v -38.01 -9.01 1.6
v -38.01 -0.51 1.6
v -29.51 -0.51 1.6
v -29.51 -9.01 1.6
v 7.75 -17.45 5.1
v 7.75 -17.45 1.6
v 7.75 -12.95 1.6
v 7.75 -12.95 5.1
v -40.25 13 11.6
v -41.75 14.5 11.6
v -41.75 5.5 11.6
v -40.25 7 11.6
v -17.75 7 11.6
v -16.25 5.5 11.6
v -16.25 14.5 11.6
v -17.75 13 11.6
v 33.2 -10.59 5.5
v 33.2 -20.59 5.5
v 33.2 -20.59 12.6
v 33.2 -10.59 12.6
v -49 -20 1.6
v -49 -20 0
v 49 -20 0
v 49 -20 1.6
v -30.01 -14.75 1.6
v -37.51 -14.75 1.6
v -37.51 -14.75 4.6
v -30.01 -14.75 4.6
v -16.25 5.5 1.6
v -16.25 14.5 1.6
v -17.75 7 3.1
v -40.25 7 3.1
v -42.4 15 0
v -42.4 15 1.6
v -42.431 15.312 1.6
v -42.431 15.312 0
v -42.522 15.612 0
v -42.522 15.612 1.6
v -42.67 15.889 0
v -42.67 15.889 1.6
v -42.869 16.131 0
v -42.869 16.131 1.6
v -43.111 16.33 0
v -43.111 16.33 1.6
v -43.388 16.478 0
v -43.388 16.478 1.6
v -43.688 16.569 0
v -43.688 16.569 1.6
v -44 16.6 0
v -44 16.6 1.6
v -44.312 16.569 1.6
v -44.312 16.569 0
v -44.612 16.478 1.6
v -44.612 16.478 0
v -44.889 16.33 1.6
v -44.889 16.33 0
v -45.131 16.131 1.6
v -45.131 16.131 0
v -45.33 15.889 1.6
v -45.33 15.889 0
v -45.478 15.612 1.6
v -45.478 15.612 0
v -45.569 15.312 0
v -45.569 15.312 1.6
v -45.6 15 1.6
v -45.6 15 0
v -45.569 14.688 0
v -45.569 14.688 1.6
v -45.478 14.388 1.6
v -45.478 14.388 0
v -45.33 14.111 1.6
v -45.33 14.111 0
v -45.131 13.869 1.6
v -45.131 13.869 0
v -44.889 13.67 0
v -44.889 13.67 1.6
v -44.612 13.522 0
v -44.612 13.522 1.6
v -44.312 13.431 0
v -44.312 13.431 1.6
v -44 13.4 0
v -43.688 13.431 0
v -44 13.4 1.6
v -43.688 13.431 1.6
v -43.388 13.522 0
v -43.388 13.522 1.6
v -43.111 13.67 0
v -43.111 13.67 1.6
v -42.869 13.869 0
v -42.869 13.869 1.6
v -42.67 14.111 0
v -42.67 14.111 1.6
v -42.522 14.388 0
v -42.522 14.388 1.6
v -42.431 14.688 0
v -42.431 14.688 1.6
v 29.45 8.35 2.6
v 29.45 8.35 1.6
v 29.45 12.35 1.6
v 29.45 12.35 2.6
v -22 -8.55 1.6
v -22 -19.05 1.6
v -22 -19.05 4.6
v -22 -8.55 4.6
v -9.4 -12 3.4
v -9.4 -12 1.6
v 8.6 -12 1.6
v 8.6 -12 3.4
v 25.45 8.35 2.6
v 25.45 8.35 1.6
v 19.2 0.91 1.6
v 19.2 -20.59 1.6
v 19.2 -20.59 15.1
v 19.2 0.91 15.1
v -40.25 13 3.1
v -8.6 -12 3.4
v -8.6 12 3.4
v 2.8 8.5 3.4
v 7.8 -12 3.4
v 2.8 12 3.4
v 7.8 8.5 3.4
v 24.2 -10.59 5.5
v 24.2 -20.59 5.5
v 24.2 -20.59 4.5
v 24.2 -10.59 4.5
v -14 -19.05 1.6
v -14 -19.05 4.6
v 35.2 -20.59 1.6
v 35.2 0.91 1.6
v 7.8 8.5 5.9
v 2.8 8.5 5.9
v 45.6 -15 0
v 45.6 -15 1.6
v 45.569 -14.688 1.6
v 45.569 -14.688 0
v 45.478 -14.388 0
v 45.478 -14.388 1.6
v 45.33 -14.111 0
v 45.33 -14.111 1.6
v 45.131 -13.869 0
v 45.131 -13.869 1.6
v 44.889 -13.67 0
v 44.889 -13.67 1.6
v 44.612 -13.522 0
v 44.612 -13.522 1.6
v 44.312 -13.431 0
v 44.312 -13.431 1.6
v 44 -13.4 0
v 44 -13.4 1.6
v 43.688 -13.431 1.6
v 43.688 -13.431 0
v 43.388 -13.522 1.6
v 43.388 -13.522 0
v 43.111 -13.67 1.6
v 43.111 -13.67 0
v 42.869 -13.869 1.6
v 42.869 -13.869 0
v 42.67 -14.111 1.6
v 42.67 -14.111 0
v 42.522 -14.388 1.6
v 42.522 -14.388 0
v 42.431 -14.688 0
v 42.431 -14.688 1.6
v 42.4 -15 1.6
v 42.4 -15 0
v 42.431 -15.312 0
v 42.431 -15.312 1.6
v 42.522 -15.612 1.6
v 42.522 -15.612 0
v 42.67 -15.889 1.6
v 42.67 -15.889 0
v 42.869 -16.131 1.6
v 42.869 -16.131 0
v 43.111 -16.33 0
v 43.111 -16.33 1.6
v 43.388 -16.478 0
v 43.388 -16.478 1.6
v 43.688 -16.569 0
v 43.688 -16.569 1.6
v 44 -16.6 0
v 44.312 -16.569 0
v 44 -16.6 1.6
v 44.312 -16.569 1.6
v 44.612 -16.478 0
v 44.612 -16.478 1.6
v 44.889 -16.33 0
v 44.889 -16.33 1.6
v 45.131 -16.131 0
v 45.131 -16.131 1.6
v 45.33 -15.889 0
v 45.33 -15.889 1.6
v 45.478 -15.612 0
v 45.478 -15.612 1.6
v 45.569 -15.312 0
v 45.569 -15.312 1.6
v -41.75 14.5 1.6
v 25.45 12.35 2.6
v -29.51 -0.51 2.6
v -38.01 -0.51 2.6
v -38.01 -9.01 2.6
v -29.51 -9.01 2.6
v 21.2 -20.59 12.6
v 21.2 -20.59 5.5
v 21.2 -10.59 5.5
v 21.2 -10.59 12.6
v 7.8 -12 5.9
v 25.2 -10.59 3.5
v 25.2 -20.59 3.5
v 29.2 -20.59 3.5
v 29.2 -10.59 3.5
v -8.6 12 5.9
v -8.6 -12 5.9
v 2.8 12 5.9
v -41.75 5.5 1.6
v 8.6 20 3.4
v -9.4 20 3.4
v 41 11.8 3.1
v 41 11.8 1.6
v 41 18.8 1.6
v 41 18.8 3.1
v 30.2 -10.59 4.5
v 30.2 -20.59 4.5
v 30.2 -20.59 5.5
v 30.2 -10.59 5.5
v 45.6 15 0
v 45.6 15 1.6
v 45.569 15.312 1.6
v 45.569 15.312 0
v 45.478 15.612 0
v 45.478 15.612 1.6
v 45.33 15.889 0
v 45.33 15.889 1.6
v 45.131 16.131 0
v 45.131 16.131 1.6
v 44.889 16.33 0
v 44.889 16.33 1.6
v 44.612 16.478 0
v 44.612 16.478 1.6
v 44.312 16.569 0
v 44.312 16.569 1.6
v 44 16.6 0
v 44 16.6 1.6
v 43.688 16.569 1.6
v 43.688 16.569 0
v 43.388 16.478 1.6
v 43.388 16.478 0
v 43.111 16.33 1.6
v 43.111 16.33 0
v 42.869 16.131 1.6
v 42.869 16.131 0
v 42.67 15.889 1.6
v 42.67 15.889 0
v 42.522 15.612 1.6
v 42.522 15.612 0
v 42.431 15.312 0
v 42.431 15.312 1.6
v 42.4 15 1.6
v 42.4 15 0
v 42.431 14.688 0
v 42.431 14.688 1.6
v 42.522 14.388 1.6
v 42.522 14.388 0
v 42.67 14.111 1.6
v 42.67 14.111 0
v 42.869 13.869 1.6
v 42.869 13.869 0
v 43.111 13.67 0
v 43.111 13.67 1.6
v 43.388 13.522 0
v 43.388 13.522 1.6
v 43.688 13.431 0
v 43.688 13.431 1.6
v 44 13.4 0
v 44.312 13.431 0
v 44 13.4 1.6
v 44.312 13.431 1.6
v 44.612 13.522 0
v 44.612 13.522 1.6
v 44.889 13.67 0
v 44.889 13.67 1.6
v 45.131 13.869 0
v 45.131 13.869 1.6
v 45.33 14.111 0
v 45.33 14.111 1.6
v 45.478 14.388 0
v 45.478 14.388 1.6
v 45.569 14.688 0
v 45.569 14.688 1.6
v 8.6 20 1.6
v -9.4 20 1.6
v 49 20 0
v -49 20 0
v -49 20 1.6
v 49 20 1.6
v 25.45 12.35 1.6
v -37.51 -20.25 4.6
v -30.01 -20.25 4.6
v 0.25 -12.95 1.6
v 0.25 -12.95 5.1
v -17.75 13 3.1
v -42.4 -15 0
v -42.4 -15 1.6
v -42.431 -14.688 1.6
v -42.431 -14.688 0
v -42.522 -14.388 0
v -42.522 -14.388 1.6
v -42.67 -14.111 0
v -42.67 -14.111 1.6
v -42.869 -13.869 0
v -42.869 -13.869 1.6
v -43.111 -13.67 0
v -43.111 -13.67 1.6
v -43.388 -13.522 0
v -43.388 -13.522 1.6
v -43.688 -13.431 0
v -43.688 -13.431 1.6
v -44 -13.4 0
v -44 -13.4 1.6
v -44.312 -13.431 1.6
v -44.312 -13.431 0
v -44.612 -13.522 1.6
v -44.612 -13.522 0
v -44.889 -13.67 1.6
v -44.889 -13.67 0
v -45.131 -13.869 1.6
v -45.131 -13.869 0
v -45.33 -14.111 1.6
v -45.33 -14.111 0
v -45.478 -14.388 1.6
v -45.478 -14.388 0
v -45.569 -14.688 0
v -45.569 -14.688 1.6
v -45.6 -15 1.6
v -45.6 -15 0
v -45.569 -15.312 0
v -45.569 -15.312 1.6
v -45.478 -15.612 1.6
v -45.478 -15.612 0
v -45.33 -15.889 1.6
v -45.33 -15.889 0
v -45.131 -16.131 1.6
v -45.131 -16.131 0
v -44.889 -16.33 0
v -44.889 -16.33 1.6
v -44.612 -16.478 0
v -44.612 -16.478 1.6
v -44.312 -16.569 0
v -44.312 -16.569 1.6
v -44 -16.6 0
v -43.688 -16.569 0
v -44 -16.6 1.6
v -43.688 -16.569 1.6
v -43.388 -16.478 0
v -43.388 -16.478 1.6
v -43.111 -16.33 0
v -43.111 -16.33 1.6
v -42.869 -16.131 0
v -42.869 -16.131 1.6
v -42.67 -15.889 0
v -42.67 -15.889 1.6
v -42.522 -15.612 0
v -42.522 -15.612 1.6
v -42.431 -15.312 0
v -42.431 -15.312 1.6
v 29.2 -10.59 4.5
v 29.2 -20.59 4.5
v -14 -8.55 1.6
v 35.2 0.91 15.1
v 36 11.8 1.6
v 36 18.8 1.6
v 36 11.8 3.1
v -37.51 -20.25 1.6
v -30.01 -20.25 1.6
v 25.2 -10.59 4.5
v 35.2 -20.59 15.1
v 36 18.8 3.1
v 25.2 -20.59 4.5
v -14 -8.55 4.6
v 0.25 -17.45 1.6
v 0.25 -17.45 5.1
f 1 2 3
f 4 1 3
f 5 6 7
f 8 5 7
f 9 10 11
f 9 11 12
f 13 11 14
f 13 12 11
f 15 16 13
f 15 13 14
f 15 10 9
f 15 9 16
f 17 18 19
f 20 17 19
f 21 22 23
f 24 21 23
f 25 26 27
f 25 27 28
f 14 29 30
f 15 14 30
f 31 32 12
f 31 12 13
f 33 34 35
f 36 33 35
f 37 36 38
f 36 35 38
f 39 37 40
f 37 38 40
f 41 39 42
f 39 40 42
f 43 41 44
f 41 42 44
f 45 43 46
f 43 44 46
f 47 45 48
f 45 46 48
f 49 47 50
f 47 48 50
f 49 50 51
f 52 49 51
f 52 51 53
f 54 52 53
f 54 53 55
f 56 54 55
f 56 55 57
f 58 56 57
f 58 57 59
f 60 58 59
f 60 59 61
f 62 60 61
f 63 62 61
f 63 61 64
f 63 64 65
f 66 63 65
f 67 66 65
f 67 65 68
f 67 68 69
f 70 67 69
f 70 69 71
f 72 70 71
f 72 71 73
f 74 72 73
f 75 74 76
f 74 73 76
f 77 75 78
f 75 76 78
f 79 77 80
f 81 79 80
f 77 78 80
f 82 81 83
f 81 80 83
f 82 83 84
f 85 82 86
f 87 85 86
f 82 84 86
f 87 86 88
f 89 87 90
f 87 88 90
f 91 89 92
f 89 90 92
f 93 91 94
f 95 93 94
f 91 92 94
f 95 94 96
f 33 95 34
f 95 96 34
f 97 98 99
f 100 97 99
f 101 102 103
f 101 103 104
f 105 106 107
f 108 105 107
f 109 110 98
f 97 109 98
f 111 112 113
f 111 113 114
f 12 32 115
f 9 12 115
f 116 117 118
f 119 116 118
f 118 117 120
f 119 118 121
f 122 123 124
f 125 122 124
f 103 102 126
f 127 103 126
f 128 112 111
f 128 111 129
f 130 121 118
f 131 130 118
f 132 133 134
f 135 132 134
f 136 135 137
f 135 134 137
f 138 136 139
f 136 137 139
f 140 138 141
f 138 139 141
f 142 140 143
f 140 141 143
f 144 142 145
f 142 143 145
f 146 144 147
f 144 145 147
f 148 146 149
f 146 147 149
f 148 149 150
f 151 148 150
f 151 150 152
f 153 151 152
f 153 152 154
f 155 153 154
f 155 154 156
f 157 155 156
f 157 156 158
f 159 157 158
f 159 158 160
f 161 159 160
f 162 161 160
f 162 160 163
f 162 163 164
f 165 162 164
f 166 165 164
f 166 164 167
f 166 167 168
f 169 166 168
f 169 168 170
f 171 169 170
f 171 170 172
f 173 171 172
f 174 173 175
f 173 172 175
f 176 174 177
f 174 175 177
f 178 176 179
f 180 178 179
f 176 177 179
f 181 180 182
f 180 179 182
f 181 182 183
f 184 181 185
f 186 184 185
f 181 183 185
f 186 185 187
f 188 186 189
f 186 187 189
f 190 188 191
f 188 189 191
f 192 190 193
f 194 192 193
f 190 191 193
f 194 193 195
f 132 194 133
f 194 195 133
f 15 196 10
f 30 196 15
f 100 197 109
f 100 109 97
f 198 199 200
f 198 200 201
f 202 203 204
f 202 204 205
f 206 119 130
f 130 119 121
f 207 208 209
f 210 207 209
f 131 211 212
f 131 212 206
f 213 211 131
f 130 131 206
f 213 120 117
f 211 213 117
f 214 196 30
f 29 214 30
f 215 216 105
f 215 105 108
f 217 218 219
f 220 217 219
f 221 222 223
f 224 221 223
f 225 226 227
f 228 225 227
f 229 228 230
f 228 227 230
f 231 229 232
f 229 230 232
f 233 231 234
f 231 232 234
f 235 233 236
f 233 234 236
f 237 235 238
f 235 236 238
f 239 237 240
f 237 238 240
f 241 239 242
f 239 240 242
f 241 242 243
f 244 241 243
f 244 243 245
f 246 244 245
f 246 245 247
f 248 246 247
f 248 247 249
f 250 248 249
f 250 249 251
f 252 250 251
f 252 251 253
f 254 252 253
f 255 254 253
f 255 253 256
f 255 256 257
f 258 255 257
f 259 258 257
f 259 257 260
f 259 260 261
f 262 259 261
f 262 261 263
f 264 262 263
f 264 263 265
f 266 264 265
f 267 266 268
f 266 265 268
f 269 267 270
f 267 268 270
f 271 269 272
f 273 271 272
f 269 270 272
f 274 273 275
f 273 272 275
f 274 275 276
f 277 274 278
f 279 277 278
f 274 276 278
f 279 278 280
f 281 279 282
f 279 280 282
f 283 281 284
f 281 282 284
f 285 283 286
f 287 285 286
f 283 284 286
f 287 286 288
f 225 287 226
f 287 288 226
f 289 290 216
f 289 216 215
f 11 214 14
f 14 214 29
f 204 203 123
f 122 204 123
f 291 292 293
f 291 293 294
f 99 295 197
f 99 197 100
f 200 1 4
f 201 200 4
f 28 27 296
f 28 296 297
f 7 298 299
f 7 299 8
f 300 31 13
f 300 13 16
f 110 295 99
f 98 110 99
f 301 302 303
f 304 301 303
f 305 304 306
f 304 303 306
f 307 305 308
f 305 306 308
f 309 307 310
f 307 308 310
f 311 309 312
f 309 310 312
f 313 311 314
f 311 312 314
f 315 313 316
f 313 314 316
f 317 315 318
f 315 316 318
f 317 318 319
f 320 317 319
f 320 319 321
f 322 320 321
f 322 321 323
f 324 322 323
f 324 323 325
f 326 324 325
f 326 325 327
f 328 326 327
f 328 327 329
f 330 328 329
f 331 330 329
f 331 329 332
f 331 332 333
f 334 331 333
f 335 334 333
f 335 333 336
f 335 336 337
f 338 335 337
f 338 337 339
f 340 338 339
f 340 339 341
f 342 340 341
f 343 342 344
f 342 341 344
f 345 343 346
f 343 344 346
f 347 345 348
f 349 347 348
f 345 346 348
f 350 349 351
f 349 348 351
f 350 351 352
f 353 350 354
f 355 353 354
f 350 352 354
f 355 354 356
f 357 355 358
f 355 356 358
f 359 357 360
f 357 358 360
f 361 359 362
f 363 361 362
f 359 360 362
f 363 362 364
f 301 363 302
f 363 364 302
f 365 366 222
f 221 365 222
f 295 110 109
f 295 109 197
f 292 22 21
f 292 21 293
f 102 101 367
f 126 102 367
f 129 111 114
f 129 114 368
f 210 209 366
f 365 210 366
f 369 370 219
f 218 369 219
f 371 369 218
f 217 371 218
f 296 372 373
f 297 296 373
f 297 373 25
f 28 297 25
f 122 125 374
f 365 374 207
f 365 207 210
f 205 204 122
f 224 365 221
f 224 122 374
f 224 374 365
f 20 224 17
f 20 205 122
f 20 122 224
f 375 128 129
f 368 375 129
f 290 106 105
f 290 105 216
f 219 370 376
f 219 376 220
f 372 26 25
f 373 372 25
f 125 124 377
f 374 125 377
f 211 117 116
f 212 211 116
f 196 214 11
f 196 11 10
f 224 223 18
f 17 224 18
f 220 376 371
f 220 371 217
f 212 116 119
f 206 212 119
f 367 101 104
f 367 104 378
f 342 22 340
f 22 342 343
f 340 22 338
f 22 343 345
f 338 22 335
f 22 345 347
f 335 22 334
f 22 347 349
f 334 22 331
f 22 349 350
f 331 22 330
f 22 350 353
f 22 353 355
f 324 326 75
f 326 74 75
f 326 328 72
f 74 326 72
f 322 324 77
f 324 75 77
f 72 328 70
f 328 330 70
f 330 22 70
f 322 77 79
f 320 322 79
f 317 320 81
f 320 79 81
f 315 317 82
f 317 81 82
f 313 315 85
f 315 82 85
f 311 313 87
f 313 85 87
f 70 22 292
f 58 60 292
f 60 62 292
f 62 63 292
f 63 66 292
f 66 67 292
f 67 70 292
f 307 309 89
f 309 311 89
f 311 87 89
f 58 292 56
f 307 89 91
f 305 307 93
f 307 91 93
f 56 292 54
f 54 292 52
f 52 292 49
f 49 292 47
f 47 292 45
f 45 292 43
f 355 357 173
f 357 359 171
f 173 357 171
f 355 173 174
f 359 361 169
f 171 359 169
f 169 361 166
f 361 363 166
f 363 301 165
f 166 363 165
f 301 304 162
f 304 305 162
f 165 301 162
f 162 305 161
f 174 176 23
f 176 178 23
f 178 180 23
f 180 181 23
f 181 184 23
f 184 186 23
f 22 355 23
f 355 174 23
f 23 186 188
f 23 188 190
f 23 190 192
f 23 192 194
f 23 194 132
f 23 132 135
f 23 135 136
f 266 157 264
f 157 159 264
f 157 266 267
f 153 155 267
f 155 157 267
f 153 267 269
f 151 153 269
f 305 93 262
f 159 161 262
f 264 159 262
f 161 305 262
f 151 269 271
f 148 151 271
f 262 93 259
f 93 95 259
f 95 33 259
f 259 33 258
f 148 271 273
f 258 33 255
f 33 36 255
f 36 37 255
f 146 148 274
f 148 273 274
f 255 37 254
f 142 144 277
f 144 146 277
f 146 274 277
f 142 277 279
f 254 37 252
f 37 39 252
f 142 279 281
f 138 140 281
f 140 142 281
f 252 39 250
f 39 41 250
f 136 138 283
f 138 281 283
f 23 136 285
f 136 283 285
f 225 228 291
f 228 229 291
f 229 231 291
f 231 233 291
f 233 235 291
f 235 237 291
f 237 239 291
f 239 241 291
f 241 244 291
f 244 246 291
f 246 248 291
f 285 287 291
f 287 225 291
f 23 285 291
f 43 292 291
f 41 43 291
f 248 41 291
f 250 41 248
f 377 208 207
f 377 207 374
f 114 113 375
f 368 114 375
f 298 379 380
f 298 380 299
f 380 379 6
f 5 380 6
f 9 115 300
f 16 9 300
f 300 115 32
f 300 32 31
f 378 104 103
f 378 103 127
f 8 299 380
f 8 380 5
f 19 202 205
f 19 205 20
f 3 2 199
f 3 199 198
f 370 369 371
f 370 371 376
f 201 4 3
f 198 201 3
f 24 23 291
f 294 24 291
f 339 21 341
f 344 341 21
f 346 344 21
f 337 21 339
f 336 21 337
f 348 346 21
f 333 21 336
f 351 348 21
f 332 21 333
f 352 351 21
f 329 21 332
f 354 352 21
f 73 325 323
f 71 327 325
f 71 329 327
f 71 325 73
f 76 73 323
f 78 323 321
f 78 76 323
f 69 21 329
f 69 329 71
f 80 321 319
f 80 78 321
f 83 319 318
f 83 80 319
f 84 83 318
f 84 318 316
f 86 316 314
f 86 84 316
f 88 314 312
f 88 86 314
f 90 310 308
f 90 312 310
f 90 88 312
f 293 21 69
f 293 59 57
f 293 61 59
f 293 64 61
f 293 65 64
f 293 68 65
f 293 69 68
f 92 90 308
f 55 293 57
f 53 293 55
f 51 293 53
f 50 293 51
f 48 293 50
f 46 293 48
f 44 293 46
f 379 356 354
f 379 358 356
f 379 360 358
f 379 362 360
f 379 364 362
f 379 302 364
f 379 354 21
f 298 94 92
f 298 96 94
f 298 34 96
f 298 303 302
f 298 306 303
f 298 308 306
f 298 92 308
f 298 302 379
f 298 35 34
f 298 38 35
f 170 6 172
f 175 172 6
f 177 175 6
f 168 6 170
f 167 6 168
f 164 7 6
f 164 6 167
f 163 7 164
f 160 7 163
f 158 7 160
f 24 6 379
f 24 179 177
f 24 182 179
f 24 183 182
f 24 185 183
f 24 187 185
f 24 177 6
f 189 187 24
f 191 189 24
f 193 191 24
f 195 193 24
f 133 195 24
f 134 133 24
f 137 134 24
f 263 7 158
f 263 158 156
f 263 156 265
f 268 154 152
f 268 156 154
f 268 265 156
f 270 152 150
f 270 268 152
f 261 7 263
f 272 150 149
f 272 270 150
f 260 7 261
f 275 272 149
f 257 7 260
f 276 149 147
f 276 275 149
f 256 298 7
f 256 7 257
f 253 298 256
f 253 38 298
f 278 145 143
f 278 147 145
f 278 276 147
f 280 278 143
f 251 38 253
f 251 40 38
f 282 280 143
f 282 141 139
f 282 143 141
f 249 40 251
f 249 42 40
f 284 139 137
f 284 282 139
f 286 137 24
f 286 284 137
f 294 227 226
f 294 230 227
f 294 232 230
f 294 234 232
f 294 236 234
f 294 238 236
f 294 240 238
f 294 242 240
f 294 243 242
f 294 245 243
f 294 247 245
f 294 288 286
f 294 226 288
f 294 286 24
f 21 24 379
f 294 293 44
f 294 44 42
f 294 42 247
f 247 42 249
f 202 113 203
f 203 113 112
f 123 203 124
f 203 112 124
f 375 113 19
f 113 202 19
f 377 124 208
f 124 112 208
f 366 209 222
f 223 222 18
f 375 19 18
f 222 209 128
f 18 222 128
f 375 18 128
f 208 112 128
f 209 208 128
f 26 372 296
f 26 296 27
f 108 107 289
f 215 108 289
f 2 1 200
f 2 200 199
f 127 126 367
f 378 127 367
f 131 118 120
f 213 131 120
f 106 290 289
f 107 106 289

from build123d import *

# Parameters (mm, degrees)
SKETCH1_W               = 98
SKETCH1_H               = 40
BOSS_EXTRUDE1_DEPTH     = 1.6
SKETCH2_R               = 1.6
CUT_EXTRUDE1_DEPTH      = 1
CUT_EXTRUDE1_DEPTH_BACK = 2.6
SKETCH3_W               = 25.5
SKETCH3_H               = 9
BOSS_EXTRUDE2_DEPTH     = 10
SHELL1_T                = -1.5
SKETCH4_W               = 8.5
SKETCH4_H               = 8.5
BOSS_EXTRUDE3_DEPTH     = 1
SKETCH5_W               = 7.5
SKETCH5_H               = 5.5
BOSS_EXTRUDE4_DEPTH     = 3
SKETCH6_W               = 8
SKETCH6_H               = 10.5
BOSS_EXTRUDE5_DEPTH     = 3
SKETCH7_W               = 18
SKETCH7_H               = 32
BOSS_EXTRUDE6_DEPTH     = 1.8
BOSS_EXTRUDE7_DEPTH     = 2.5
SKETCH9_W               = 7.5
SKETCH9_H               = 4.5
BOSS_EXTRUDE8_DEPTH     = 3.5
SKETCH10_W              = 16
SKETCH10_H              = 21.5
BOSS_EXTRUDE9_DEPTH     = 13.5
SKETCH11_W              = 12
SKETCH11_H              = 7.1
SKETCH11_W_2            = 4
SKETCH11_H_2            = 1
CUT_EXTRUDE2_DEPTH      = 10
SKETCH12_W              = 4
SKETCH12_H              = 4
BOSS_EXTRUDE10_DEPTH    = 1
SKETCH13_W              = 5
SKETCH13_H              = 7
BOSS_EXTRUDE11_DEPTH    = 1.5


with BuildPart() as part:
    # Sketch1 → Boss-Extrude1 (new body)
    with BuildSketch(Plane.XY):
        Rectangle(SKETCH1_W, SKETCH1_H)
    extrude(amount=BOSS_EXTRUDE1_DEPTH)

    # Sketch2 → Cut-Extrude1 (cut, two sides)
    with BuildSketch(Plane.XY.offset(1.6)) as cut_extrude1_sk:
        with Locations((-44, -15)):
            Circle(SKETCH2_R)
        with Locations((-44, 15)):
            Circle(SKETCH2_R)
        with Locations((44, 15)):
            Circle(SKETCH2_R)
        with Locations((44, -15)):
            Circle(SKETCH2_R)
    extrude(amount=CUT_EXTRUDE1_DEPTH, mode=Mode.SUBTRACT)
    extrude(cut_extrude1_sk.sketch, amount=-CUT_EXTRUDE1_DEPTH_BACK, mode=Mode.SUBTRACT)

    # Sketch9 → Boss-Extrude8 (add)
    with BuildSketch(Plane.XY.offset(1.6)):
        with Locations((4, -15.2)):
            Rectangle(SKETCH9_W, SKETCH9_H)
    extrude(amount=BOSS_EXTRUDE8_DEPTH)


with BuildPart() as body_2:
    # Sketch3 → Boss-Extrude2 (new body)
    with BuildSketch(Plane.XY.offset(1.6)):
        with Locations((-29, 10)):
            Rectangle(SKETCH3_W, SKETCH3_H)
    extrude(amount=BOSS_EXTRUDE2_DEPTH)

    # Shell1
    shell1_openings = [body_2.faces().sort_by_distance(p)[0] for p in [
        (-29, 10, 11.6),
    ]]
    offset(amount=SHELL1_T, openings=shell1_openings, kind=Kind.INTERSECTION)


with BuildPart() as body_3:
    # Sketch4 → Boss-Extrude3 (new body)
    with BuildSketch(Plane.XY.offset(1.6)):
        with Locations((-33.76, -4.76)):
            Rectangle(SKETCH4_W, SKETCH4_H)
    extrude(amount=BOSS_EXTRUDE3_DEPTH)


with BuildPart() as body_4:
    # Sketch5 → Boss-Extrude4 (new body)
    with BuildSketch(Plane.XY.offset(1.6)):
        with Locations((-33.76, -17.5)):
            Rectangle(SKETCH5_W, SKETCH5_H)
    extrude(amount=BOSS_EXTRUDE4_DEPTH)


with BuildPart() as body_5:
    # Sketch6 → Boss-Extrude5 (new body)
    with BuildSketch(Plane.XY.offset(1.6)):
        with Locations((-18, -13.8)):
            Rectangle(SKETCH6_W, SKETCH6_H)
    extrude(amount=BOSS_EXTRUDE5_DEPTH)


with BuildPart() as body_6:
    # Sketch7 → Boss-Extrude6 (new body)
    with BuildSketch(Plane.XY.offset(1.6)):
        with Locations((-0.4, 4)):
            Rectangle(SKETCH7_W, SKETCH7_H)
    extrude(amount=BOSS_EXTRUDE6_DEPTH)


with BuildPart() as body_7:
    # Sketch8 → Boss-Extrude7 (new body)
    with BuildSketch(Plane.XY.offset(3.4)):
        Polygon((-8.6, 12), (-8.6, -12), (7.8, -12), (7.8, 8.5), (2.8, 8.5), (2.8, 12), align=None)
    extrude(amount=BOSS_EXTRUDE7_DEPTH)


with BuildPart() as body_8:
    # Sketch10 → Boss-Extrude9 (new body)
    with BuildSketch(Plane.XY.offset(1.6)):
        with Locations((27.2, -9.84)):
            Rectangle(SKETCH10_W, SKETCH10_H)
    extrude(amount=BOSS_EXTRUDE9_DEPTH)

    # Sketch11 → Cut-Extrude2 (cut)
    with BuildSketch(Plane.XZ.offset(20.59)):
        with Locations((27.2, 9.05)):
            Rectangle(SKETCH11_W, SKETCH11_H)
        Polygon((30.2, 5.5), (24.2, 5.5), (24.2, 4.5), (25.2, 4.5), (29.2, 4.5), (30.2, 4.5), align=None)
        with Locations((27.2, 4)):
            Rectangle(SKETCH11_W_2, SKETCH11_H_2)
    extrude(amount=-CUT_EXTRUDE2_DEPTH, mode=Mode.SUBTRACT)


with BuildPart() as body_9:
    # Sketch12 → Boss-Extrude10 (new body)
    with BuildSketch(Plane.XY.offset(1.6)):
        with Locations((27.45, 10.35)):
            Rectangle(SKETCH12_W, SKETCH12_H)
    extrude(amount=BOSS_EXTRUDE10_DEPTH)


with BuildPart() as body_10:
    # Sketch13 → Boss-Extrude11 (new body)
    with BuildSketch(Plane.XY.offset(1.6)):
        with Locations((38.5, 15.3)):
            Rectangle(SKETCH13_W, SKETCH13_H)
    extrude(amount=BOSS_EXTRUDE11_DEPTH)


solid = Compound([part.part, body_2.part, body_3.part, body_4.part, body_5.part, body_6.part, body_7.part, body_8.part, body_9.part, body_10.part])
